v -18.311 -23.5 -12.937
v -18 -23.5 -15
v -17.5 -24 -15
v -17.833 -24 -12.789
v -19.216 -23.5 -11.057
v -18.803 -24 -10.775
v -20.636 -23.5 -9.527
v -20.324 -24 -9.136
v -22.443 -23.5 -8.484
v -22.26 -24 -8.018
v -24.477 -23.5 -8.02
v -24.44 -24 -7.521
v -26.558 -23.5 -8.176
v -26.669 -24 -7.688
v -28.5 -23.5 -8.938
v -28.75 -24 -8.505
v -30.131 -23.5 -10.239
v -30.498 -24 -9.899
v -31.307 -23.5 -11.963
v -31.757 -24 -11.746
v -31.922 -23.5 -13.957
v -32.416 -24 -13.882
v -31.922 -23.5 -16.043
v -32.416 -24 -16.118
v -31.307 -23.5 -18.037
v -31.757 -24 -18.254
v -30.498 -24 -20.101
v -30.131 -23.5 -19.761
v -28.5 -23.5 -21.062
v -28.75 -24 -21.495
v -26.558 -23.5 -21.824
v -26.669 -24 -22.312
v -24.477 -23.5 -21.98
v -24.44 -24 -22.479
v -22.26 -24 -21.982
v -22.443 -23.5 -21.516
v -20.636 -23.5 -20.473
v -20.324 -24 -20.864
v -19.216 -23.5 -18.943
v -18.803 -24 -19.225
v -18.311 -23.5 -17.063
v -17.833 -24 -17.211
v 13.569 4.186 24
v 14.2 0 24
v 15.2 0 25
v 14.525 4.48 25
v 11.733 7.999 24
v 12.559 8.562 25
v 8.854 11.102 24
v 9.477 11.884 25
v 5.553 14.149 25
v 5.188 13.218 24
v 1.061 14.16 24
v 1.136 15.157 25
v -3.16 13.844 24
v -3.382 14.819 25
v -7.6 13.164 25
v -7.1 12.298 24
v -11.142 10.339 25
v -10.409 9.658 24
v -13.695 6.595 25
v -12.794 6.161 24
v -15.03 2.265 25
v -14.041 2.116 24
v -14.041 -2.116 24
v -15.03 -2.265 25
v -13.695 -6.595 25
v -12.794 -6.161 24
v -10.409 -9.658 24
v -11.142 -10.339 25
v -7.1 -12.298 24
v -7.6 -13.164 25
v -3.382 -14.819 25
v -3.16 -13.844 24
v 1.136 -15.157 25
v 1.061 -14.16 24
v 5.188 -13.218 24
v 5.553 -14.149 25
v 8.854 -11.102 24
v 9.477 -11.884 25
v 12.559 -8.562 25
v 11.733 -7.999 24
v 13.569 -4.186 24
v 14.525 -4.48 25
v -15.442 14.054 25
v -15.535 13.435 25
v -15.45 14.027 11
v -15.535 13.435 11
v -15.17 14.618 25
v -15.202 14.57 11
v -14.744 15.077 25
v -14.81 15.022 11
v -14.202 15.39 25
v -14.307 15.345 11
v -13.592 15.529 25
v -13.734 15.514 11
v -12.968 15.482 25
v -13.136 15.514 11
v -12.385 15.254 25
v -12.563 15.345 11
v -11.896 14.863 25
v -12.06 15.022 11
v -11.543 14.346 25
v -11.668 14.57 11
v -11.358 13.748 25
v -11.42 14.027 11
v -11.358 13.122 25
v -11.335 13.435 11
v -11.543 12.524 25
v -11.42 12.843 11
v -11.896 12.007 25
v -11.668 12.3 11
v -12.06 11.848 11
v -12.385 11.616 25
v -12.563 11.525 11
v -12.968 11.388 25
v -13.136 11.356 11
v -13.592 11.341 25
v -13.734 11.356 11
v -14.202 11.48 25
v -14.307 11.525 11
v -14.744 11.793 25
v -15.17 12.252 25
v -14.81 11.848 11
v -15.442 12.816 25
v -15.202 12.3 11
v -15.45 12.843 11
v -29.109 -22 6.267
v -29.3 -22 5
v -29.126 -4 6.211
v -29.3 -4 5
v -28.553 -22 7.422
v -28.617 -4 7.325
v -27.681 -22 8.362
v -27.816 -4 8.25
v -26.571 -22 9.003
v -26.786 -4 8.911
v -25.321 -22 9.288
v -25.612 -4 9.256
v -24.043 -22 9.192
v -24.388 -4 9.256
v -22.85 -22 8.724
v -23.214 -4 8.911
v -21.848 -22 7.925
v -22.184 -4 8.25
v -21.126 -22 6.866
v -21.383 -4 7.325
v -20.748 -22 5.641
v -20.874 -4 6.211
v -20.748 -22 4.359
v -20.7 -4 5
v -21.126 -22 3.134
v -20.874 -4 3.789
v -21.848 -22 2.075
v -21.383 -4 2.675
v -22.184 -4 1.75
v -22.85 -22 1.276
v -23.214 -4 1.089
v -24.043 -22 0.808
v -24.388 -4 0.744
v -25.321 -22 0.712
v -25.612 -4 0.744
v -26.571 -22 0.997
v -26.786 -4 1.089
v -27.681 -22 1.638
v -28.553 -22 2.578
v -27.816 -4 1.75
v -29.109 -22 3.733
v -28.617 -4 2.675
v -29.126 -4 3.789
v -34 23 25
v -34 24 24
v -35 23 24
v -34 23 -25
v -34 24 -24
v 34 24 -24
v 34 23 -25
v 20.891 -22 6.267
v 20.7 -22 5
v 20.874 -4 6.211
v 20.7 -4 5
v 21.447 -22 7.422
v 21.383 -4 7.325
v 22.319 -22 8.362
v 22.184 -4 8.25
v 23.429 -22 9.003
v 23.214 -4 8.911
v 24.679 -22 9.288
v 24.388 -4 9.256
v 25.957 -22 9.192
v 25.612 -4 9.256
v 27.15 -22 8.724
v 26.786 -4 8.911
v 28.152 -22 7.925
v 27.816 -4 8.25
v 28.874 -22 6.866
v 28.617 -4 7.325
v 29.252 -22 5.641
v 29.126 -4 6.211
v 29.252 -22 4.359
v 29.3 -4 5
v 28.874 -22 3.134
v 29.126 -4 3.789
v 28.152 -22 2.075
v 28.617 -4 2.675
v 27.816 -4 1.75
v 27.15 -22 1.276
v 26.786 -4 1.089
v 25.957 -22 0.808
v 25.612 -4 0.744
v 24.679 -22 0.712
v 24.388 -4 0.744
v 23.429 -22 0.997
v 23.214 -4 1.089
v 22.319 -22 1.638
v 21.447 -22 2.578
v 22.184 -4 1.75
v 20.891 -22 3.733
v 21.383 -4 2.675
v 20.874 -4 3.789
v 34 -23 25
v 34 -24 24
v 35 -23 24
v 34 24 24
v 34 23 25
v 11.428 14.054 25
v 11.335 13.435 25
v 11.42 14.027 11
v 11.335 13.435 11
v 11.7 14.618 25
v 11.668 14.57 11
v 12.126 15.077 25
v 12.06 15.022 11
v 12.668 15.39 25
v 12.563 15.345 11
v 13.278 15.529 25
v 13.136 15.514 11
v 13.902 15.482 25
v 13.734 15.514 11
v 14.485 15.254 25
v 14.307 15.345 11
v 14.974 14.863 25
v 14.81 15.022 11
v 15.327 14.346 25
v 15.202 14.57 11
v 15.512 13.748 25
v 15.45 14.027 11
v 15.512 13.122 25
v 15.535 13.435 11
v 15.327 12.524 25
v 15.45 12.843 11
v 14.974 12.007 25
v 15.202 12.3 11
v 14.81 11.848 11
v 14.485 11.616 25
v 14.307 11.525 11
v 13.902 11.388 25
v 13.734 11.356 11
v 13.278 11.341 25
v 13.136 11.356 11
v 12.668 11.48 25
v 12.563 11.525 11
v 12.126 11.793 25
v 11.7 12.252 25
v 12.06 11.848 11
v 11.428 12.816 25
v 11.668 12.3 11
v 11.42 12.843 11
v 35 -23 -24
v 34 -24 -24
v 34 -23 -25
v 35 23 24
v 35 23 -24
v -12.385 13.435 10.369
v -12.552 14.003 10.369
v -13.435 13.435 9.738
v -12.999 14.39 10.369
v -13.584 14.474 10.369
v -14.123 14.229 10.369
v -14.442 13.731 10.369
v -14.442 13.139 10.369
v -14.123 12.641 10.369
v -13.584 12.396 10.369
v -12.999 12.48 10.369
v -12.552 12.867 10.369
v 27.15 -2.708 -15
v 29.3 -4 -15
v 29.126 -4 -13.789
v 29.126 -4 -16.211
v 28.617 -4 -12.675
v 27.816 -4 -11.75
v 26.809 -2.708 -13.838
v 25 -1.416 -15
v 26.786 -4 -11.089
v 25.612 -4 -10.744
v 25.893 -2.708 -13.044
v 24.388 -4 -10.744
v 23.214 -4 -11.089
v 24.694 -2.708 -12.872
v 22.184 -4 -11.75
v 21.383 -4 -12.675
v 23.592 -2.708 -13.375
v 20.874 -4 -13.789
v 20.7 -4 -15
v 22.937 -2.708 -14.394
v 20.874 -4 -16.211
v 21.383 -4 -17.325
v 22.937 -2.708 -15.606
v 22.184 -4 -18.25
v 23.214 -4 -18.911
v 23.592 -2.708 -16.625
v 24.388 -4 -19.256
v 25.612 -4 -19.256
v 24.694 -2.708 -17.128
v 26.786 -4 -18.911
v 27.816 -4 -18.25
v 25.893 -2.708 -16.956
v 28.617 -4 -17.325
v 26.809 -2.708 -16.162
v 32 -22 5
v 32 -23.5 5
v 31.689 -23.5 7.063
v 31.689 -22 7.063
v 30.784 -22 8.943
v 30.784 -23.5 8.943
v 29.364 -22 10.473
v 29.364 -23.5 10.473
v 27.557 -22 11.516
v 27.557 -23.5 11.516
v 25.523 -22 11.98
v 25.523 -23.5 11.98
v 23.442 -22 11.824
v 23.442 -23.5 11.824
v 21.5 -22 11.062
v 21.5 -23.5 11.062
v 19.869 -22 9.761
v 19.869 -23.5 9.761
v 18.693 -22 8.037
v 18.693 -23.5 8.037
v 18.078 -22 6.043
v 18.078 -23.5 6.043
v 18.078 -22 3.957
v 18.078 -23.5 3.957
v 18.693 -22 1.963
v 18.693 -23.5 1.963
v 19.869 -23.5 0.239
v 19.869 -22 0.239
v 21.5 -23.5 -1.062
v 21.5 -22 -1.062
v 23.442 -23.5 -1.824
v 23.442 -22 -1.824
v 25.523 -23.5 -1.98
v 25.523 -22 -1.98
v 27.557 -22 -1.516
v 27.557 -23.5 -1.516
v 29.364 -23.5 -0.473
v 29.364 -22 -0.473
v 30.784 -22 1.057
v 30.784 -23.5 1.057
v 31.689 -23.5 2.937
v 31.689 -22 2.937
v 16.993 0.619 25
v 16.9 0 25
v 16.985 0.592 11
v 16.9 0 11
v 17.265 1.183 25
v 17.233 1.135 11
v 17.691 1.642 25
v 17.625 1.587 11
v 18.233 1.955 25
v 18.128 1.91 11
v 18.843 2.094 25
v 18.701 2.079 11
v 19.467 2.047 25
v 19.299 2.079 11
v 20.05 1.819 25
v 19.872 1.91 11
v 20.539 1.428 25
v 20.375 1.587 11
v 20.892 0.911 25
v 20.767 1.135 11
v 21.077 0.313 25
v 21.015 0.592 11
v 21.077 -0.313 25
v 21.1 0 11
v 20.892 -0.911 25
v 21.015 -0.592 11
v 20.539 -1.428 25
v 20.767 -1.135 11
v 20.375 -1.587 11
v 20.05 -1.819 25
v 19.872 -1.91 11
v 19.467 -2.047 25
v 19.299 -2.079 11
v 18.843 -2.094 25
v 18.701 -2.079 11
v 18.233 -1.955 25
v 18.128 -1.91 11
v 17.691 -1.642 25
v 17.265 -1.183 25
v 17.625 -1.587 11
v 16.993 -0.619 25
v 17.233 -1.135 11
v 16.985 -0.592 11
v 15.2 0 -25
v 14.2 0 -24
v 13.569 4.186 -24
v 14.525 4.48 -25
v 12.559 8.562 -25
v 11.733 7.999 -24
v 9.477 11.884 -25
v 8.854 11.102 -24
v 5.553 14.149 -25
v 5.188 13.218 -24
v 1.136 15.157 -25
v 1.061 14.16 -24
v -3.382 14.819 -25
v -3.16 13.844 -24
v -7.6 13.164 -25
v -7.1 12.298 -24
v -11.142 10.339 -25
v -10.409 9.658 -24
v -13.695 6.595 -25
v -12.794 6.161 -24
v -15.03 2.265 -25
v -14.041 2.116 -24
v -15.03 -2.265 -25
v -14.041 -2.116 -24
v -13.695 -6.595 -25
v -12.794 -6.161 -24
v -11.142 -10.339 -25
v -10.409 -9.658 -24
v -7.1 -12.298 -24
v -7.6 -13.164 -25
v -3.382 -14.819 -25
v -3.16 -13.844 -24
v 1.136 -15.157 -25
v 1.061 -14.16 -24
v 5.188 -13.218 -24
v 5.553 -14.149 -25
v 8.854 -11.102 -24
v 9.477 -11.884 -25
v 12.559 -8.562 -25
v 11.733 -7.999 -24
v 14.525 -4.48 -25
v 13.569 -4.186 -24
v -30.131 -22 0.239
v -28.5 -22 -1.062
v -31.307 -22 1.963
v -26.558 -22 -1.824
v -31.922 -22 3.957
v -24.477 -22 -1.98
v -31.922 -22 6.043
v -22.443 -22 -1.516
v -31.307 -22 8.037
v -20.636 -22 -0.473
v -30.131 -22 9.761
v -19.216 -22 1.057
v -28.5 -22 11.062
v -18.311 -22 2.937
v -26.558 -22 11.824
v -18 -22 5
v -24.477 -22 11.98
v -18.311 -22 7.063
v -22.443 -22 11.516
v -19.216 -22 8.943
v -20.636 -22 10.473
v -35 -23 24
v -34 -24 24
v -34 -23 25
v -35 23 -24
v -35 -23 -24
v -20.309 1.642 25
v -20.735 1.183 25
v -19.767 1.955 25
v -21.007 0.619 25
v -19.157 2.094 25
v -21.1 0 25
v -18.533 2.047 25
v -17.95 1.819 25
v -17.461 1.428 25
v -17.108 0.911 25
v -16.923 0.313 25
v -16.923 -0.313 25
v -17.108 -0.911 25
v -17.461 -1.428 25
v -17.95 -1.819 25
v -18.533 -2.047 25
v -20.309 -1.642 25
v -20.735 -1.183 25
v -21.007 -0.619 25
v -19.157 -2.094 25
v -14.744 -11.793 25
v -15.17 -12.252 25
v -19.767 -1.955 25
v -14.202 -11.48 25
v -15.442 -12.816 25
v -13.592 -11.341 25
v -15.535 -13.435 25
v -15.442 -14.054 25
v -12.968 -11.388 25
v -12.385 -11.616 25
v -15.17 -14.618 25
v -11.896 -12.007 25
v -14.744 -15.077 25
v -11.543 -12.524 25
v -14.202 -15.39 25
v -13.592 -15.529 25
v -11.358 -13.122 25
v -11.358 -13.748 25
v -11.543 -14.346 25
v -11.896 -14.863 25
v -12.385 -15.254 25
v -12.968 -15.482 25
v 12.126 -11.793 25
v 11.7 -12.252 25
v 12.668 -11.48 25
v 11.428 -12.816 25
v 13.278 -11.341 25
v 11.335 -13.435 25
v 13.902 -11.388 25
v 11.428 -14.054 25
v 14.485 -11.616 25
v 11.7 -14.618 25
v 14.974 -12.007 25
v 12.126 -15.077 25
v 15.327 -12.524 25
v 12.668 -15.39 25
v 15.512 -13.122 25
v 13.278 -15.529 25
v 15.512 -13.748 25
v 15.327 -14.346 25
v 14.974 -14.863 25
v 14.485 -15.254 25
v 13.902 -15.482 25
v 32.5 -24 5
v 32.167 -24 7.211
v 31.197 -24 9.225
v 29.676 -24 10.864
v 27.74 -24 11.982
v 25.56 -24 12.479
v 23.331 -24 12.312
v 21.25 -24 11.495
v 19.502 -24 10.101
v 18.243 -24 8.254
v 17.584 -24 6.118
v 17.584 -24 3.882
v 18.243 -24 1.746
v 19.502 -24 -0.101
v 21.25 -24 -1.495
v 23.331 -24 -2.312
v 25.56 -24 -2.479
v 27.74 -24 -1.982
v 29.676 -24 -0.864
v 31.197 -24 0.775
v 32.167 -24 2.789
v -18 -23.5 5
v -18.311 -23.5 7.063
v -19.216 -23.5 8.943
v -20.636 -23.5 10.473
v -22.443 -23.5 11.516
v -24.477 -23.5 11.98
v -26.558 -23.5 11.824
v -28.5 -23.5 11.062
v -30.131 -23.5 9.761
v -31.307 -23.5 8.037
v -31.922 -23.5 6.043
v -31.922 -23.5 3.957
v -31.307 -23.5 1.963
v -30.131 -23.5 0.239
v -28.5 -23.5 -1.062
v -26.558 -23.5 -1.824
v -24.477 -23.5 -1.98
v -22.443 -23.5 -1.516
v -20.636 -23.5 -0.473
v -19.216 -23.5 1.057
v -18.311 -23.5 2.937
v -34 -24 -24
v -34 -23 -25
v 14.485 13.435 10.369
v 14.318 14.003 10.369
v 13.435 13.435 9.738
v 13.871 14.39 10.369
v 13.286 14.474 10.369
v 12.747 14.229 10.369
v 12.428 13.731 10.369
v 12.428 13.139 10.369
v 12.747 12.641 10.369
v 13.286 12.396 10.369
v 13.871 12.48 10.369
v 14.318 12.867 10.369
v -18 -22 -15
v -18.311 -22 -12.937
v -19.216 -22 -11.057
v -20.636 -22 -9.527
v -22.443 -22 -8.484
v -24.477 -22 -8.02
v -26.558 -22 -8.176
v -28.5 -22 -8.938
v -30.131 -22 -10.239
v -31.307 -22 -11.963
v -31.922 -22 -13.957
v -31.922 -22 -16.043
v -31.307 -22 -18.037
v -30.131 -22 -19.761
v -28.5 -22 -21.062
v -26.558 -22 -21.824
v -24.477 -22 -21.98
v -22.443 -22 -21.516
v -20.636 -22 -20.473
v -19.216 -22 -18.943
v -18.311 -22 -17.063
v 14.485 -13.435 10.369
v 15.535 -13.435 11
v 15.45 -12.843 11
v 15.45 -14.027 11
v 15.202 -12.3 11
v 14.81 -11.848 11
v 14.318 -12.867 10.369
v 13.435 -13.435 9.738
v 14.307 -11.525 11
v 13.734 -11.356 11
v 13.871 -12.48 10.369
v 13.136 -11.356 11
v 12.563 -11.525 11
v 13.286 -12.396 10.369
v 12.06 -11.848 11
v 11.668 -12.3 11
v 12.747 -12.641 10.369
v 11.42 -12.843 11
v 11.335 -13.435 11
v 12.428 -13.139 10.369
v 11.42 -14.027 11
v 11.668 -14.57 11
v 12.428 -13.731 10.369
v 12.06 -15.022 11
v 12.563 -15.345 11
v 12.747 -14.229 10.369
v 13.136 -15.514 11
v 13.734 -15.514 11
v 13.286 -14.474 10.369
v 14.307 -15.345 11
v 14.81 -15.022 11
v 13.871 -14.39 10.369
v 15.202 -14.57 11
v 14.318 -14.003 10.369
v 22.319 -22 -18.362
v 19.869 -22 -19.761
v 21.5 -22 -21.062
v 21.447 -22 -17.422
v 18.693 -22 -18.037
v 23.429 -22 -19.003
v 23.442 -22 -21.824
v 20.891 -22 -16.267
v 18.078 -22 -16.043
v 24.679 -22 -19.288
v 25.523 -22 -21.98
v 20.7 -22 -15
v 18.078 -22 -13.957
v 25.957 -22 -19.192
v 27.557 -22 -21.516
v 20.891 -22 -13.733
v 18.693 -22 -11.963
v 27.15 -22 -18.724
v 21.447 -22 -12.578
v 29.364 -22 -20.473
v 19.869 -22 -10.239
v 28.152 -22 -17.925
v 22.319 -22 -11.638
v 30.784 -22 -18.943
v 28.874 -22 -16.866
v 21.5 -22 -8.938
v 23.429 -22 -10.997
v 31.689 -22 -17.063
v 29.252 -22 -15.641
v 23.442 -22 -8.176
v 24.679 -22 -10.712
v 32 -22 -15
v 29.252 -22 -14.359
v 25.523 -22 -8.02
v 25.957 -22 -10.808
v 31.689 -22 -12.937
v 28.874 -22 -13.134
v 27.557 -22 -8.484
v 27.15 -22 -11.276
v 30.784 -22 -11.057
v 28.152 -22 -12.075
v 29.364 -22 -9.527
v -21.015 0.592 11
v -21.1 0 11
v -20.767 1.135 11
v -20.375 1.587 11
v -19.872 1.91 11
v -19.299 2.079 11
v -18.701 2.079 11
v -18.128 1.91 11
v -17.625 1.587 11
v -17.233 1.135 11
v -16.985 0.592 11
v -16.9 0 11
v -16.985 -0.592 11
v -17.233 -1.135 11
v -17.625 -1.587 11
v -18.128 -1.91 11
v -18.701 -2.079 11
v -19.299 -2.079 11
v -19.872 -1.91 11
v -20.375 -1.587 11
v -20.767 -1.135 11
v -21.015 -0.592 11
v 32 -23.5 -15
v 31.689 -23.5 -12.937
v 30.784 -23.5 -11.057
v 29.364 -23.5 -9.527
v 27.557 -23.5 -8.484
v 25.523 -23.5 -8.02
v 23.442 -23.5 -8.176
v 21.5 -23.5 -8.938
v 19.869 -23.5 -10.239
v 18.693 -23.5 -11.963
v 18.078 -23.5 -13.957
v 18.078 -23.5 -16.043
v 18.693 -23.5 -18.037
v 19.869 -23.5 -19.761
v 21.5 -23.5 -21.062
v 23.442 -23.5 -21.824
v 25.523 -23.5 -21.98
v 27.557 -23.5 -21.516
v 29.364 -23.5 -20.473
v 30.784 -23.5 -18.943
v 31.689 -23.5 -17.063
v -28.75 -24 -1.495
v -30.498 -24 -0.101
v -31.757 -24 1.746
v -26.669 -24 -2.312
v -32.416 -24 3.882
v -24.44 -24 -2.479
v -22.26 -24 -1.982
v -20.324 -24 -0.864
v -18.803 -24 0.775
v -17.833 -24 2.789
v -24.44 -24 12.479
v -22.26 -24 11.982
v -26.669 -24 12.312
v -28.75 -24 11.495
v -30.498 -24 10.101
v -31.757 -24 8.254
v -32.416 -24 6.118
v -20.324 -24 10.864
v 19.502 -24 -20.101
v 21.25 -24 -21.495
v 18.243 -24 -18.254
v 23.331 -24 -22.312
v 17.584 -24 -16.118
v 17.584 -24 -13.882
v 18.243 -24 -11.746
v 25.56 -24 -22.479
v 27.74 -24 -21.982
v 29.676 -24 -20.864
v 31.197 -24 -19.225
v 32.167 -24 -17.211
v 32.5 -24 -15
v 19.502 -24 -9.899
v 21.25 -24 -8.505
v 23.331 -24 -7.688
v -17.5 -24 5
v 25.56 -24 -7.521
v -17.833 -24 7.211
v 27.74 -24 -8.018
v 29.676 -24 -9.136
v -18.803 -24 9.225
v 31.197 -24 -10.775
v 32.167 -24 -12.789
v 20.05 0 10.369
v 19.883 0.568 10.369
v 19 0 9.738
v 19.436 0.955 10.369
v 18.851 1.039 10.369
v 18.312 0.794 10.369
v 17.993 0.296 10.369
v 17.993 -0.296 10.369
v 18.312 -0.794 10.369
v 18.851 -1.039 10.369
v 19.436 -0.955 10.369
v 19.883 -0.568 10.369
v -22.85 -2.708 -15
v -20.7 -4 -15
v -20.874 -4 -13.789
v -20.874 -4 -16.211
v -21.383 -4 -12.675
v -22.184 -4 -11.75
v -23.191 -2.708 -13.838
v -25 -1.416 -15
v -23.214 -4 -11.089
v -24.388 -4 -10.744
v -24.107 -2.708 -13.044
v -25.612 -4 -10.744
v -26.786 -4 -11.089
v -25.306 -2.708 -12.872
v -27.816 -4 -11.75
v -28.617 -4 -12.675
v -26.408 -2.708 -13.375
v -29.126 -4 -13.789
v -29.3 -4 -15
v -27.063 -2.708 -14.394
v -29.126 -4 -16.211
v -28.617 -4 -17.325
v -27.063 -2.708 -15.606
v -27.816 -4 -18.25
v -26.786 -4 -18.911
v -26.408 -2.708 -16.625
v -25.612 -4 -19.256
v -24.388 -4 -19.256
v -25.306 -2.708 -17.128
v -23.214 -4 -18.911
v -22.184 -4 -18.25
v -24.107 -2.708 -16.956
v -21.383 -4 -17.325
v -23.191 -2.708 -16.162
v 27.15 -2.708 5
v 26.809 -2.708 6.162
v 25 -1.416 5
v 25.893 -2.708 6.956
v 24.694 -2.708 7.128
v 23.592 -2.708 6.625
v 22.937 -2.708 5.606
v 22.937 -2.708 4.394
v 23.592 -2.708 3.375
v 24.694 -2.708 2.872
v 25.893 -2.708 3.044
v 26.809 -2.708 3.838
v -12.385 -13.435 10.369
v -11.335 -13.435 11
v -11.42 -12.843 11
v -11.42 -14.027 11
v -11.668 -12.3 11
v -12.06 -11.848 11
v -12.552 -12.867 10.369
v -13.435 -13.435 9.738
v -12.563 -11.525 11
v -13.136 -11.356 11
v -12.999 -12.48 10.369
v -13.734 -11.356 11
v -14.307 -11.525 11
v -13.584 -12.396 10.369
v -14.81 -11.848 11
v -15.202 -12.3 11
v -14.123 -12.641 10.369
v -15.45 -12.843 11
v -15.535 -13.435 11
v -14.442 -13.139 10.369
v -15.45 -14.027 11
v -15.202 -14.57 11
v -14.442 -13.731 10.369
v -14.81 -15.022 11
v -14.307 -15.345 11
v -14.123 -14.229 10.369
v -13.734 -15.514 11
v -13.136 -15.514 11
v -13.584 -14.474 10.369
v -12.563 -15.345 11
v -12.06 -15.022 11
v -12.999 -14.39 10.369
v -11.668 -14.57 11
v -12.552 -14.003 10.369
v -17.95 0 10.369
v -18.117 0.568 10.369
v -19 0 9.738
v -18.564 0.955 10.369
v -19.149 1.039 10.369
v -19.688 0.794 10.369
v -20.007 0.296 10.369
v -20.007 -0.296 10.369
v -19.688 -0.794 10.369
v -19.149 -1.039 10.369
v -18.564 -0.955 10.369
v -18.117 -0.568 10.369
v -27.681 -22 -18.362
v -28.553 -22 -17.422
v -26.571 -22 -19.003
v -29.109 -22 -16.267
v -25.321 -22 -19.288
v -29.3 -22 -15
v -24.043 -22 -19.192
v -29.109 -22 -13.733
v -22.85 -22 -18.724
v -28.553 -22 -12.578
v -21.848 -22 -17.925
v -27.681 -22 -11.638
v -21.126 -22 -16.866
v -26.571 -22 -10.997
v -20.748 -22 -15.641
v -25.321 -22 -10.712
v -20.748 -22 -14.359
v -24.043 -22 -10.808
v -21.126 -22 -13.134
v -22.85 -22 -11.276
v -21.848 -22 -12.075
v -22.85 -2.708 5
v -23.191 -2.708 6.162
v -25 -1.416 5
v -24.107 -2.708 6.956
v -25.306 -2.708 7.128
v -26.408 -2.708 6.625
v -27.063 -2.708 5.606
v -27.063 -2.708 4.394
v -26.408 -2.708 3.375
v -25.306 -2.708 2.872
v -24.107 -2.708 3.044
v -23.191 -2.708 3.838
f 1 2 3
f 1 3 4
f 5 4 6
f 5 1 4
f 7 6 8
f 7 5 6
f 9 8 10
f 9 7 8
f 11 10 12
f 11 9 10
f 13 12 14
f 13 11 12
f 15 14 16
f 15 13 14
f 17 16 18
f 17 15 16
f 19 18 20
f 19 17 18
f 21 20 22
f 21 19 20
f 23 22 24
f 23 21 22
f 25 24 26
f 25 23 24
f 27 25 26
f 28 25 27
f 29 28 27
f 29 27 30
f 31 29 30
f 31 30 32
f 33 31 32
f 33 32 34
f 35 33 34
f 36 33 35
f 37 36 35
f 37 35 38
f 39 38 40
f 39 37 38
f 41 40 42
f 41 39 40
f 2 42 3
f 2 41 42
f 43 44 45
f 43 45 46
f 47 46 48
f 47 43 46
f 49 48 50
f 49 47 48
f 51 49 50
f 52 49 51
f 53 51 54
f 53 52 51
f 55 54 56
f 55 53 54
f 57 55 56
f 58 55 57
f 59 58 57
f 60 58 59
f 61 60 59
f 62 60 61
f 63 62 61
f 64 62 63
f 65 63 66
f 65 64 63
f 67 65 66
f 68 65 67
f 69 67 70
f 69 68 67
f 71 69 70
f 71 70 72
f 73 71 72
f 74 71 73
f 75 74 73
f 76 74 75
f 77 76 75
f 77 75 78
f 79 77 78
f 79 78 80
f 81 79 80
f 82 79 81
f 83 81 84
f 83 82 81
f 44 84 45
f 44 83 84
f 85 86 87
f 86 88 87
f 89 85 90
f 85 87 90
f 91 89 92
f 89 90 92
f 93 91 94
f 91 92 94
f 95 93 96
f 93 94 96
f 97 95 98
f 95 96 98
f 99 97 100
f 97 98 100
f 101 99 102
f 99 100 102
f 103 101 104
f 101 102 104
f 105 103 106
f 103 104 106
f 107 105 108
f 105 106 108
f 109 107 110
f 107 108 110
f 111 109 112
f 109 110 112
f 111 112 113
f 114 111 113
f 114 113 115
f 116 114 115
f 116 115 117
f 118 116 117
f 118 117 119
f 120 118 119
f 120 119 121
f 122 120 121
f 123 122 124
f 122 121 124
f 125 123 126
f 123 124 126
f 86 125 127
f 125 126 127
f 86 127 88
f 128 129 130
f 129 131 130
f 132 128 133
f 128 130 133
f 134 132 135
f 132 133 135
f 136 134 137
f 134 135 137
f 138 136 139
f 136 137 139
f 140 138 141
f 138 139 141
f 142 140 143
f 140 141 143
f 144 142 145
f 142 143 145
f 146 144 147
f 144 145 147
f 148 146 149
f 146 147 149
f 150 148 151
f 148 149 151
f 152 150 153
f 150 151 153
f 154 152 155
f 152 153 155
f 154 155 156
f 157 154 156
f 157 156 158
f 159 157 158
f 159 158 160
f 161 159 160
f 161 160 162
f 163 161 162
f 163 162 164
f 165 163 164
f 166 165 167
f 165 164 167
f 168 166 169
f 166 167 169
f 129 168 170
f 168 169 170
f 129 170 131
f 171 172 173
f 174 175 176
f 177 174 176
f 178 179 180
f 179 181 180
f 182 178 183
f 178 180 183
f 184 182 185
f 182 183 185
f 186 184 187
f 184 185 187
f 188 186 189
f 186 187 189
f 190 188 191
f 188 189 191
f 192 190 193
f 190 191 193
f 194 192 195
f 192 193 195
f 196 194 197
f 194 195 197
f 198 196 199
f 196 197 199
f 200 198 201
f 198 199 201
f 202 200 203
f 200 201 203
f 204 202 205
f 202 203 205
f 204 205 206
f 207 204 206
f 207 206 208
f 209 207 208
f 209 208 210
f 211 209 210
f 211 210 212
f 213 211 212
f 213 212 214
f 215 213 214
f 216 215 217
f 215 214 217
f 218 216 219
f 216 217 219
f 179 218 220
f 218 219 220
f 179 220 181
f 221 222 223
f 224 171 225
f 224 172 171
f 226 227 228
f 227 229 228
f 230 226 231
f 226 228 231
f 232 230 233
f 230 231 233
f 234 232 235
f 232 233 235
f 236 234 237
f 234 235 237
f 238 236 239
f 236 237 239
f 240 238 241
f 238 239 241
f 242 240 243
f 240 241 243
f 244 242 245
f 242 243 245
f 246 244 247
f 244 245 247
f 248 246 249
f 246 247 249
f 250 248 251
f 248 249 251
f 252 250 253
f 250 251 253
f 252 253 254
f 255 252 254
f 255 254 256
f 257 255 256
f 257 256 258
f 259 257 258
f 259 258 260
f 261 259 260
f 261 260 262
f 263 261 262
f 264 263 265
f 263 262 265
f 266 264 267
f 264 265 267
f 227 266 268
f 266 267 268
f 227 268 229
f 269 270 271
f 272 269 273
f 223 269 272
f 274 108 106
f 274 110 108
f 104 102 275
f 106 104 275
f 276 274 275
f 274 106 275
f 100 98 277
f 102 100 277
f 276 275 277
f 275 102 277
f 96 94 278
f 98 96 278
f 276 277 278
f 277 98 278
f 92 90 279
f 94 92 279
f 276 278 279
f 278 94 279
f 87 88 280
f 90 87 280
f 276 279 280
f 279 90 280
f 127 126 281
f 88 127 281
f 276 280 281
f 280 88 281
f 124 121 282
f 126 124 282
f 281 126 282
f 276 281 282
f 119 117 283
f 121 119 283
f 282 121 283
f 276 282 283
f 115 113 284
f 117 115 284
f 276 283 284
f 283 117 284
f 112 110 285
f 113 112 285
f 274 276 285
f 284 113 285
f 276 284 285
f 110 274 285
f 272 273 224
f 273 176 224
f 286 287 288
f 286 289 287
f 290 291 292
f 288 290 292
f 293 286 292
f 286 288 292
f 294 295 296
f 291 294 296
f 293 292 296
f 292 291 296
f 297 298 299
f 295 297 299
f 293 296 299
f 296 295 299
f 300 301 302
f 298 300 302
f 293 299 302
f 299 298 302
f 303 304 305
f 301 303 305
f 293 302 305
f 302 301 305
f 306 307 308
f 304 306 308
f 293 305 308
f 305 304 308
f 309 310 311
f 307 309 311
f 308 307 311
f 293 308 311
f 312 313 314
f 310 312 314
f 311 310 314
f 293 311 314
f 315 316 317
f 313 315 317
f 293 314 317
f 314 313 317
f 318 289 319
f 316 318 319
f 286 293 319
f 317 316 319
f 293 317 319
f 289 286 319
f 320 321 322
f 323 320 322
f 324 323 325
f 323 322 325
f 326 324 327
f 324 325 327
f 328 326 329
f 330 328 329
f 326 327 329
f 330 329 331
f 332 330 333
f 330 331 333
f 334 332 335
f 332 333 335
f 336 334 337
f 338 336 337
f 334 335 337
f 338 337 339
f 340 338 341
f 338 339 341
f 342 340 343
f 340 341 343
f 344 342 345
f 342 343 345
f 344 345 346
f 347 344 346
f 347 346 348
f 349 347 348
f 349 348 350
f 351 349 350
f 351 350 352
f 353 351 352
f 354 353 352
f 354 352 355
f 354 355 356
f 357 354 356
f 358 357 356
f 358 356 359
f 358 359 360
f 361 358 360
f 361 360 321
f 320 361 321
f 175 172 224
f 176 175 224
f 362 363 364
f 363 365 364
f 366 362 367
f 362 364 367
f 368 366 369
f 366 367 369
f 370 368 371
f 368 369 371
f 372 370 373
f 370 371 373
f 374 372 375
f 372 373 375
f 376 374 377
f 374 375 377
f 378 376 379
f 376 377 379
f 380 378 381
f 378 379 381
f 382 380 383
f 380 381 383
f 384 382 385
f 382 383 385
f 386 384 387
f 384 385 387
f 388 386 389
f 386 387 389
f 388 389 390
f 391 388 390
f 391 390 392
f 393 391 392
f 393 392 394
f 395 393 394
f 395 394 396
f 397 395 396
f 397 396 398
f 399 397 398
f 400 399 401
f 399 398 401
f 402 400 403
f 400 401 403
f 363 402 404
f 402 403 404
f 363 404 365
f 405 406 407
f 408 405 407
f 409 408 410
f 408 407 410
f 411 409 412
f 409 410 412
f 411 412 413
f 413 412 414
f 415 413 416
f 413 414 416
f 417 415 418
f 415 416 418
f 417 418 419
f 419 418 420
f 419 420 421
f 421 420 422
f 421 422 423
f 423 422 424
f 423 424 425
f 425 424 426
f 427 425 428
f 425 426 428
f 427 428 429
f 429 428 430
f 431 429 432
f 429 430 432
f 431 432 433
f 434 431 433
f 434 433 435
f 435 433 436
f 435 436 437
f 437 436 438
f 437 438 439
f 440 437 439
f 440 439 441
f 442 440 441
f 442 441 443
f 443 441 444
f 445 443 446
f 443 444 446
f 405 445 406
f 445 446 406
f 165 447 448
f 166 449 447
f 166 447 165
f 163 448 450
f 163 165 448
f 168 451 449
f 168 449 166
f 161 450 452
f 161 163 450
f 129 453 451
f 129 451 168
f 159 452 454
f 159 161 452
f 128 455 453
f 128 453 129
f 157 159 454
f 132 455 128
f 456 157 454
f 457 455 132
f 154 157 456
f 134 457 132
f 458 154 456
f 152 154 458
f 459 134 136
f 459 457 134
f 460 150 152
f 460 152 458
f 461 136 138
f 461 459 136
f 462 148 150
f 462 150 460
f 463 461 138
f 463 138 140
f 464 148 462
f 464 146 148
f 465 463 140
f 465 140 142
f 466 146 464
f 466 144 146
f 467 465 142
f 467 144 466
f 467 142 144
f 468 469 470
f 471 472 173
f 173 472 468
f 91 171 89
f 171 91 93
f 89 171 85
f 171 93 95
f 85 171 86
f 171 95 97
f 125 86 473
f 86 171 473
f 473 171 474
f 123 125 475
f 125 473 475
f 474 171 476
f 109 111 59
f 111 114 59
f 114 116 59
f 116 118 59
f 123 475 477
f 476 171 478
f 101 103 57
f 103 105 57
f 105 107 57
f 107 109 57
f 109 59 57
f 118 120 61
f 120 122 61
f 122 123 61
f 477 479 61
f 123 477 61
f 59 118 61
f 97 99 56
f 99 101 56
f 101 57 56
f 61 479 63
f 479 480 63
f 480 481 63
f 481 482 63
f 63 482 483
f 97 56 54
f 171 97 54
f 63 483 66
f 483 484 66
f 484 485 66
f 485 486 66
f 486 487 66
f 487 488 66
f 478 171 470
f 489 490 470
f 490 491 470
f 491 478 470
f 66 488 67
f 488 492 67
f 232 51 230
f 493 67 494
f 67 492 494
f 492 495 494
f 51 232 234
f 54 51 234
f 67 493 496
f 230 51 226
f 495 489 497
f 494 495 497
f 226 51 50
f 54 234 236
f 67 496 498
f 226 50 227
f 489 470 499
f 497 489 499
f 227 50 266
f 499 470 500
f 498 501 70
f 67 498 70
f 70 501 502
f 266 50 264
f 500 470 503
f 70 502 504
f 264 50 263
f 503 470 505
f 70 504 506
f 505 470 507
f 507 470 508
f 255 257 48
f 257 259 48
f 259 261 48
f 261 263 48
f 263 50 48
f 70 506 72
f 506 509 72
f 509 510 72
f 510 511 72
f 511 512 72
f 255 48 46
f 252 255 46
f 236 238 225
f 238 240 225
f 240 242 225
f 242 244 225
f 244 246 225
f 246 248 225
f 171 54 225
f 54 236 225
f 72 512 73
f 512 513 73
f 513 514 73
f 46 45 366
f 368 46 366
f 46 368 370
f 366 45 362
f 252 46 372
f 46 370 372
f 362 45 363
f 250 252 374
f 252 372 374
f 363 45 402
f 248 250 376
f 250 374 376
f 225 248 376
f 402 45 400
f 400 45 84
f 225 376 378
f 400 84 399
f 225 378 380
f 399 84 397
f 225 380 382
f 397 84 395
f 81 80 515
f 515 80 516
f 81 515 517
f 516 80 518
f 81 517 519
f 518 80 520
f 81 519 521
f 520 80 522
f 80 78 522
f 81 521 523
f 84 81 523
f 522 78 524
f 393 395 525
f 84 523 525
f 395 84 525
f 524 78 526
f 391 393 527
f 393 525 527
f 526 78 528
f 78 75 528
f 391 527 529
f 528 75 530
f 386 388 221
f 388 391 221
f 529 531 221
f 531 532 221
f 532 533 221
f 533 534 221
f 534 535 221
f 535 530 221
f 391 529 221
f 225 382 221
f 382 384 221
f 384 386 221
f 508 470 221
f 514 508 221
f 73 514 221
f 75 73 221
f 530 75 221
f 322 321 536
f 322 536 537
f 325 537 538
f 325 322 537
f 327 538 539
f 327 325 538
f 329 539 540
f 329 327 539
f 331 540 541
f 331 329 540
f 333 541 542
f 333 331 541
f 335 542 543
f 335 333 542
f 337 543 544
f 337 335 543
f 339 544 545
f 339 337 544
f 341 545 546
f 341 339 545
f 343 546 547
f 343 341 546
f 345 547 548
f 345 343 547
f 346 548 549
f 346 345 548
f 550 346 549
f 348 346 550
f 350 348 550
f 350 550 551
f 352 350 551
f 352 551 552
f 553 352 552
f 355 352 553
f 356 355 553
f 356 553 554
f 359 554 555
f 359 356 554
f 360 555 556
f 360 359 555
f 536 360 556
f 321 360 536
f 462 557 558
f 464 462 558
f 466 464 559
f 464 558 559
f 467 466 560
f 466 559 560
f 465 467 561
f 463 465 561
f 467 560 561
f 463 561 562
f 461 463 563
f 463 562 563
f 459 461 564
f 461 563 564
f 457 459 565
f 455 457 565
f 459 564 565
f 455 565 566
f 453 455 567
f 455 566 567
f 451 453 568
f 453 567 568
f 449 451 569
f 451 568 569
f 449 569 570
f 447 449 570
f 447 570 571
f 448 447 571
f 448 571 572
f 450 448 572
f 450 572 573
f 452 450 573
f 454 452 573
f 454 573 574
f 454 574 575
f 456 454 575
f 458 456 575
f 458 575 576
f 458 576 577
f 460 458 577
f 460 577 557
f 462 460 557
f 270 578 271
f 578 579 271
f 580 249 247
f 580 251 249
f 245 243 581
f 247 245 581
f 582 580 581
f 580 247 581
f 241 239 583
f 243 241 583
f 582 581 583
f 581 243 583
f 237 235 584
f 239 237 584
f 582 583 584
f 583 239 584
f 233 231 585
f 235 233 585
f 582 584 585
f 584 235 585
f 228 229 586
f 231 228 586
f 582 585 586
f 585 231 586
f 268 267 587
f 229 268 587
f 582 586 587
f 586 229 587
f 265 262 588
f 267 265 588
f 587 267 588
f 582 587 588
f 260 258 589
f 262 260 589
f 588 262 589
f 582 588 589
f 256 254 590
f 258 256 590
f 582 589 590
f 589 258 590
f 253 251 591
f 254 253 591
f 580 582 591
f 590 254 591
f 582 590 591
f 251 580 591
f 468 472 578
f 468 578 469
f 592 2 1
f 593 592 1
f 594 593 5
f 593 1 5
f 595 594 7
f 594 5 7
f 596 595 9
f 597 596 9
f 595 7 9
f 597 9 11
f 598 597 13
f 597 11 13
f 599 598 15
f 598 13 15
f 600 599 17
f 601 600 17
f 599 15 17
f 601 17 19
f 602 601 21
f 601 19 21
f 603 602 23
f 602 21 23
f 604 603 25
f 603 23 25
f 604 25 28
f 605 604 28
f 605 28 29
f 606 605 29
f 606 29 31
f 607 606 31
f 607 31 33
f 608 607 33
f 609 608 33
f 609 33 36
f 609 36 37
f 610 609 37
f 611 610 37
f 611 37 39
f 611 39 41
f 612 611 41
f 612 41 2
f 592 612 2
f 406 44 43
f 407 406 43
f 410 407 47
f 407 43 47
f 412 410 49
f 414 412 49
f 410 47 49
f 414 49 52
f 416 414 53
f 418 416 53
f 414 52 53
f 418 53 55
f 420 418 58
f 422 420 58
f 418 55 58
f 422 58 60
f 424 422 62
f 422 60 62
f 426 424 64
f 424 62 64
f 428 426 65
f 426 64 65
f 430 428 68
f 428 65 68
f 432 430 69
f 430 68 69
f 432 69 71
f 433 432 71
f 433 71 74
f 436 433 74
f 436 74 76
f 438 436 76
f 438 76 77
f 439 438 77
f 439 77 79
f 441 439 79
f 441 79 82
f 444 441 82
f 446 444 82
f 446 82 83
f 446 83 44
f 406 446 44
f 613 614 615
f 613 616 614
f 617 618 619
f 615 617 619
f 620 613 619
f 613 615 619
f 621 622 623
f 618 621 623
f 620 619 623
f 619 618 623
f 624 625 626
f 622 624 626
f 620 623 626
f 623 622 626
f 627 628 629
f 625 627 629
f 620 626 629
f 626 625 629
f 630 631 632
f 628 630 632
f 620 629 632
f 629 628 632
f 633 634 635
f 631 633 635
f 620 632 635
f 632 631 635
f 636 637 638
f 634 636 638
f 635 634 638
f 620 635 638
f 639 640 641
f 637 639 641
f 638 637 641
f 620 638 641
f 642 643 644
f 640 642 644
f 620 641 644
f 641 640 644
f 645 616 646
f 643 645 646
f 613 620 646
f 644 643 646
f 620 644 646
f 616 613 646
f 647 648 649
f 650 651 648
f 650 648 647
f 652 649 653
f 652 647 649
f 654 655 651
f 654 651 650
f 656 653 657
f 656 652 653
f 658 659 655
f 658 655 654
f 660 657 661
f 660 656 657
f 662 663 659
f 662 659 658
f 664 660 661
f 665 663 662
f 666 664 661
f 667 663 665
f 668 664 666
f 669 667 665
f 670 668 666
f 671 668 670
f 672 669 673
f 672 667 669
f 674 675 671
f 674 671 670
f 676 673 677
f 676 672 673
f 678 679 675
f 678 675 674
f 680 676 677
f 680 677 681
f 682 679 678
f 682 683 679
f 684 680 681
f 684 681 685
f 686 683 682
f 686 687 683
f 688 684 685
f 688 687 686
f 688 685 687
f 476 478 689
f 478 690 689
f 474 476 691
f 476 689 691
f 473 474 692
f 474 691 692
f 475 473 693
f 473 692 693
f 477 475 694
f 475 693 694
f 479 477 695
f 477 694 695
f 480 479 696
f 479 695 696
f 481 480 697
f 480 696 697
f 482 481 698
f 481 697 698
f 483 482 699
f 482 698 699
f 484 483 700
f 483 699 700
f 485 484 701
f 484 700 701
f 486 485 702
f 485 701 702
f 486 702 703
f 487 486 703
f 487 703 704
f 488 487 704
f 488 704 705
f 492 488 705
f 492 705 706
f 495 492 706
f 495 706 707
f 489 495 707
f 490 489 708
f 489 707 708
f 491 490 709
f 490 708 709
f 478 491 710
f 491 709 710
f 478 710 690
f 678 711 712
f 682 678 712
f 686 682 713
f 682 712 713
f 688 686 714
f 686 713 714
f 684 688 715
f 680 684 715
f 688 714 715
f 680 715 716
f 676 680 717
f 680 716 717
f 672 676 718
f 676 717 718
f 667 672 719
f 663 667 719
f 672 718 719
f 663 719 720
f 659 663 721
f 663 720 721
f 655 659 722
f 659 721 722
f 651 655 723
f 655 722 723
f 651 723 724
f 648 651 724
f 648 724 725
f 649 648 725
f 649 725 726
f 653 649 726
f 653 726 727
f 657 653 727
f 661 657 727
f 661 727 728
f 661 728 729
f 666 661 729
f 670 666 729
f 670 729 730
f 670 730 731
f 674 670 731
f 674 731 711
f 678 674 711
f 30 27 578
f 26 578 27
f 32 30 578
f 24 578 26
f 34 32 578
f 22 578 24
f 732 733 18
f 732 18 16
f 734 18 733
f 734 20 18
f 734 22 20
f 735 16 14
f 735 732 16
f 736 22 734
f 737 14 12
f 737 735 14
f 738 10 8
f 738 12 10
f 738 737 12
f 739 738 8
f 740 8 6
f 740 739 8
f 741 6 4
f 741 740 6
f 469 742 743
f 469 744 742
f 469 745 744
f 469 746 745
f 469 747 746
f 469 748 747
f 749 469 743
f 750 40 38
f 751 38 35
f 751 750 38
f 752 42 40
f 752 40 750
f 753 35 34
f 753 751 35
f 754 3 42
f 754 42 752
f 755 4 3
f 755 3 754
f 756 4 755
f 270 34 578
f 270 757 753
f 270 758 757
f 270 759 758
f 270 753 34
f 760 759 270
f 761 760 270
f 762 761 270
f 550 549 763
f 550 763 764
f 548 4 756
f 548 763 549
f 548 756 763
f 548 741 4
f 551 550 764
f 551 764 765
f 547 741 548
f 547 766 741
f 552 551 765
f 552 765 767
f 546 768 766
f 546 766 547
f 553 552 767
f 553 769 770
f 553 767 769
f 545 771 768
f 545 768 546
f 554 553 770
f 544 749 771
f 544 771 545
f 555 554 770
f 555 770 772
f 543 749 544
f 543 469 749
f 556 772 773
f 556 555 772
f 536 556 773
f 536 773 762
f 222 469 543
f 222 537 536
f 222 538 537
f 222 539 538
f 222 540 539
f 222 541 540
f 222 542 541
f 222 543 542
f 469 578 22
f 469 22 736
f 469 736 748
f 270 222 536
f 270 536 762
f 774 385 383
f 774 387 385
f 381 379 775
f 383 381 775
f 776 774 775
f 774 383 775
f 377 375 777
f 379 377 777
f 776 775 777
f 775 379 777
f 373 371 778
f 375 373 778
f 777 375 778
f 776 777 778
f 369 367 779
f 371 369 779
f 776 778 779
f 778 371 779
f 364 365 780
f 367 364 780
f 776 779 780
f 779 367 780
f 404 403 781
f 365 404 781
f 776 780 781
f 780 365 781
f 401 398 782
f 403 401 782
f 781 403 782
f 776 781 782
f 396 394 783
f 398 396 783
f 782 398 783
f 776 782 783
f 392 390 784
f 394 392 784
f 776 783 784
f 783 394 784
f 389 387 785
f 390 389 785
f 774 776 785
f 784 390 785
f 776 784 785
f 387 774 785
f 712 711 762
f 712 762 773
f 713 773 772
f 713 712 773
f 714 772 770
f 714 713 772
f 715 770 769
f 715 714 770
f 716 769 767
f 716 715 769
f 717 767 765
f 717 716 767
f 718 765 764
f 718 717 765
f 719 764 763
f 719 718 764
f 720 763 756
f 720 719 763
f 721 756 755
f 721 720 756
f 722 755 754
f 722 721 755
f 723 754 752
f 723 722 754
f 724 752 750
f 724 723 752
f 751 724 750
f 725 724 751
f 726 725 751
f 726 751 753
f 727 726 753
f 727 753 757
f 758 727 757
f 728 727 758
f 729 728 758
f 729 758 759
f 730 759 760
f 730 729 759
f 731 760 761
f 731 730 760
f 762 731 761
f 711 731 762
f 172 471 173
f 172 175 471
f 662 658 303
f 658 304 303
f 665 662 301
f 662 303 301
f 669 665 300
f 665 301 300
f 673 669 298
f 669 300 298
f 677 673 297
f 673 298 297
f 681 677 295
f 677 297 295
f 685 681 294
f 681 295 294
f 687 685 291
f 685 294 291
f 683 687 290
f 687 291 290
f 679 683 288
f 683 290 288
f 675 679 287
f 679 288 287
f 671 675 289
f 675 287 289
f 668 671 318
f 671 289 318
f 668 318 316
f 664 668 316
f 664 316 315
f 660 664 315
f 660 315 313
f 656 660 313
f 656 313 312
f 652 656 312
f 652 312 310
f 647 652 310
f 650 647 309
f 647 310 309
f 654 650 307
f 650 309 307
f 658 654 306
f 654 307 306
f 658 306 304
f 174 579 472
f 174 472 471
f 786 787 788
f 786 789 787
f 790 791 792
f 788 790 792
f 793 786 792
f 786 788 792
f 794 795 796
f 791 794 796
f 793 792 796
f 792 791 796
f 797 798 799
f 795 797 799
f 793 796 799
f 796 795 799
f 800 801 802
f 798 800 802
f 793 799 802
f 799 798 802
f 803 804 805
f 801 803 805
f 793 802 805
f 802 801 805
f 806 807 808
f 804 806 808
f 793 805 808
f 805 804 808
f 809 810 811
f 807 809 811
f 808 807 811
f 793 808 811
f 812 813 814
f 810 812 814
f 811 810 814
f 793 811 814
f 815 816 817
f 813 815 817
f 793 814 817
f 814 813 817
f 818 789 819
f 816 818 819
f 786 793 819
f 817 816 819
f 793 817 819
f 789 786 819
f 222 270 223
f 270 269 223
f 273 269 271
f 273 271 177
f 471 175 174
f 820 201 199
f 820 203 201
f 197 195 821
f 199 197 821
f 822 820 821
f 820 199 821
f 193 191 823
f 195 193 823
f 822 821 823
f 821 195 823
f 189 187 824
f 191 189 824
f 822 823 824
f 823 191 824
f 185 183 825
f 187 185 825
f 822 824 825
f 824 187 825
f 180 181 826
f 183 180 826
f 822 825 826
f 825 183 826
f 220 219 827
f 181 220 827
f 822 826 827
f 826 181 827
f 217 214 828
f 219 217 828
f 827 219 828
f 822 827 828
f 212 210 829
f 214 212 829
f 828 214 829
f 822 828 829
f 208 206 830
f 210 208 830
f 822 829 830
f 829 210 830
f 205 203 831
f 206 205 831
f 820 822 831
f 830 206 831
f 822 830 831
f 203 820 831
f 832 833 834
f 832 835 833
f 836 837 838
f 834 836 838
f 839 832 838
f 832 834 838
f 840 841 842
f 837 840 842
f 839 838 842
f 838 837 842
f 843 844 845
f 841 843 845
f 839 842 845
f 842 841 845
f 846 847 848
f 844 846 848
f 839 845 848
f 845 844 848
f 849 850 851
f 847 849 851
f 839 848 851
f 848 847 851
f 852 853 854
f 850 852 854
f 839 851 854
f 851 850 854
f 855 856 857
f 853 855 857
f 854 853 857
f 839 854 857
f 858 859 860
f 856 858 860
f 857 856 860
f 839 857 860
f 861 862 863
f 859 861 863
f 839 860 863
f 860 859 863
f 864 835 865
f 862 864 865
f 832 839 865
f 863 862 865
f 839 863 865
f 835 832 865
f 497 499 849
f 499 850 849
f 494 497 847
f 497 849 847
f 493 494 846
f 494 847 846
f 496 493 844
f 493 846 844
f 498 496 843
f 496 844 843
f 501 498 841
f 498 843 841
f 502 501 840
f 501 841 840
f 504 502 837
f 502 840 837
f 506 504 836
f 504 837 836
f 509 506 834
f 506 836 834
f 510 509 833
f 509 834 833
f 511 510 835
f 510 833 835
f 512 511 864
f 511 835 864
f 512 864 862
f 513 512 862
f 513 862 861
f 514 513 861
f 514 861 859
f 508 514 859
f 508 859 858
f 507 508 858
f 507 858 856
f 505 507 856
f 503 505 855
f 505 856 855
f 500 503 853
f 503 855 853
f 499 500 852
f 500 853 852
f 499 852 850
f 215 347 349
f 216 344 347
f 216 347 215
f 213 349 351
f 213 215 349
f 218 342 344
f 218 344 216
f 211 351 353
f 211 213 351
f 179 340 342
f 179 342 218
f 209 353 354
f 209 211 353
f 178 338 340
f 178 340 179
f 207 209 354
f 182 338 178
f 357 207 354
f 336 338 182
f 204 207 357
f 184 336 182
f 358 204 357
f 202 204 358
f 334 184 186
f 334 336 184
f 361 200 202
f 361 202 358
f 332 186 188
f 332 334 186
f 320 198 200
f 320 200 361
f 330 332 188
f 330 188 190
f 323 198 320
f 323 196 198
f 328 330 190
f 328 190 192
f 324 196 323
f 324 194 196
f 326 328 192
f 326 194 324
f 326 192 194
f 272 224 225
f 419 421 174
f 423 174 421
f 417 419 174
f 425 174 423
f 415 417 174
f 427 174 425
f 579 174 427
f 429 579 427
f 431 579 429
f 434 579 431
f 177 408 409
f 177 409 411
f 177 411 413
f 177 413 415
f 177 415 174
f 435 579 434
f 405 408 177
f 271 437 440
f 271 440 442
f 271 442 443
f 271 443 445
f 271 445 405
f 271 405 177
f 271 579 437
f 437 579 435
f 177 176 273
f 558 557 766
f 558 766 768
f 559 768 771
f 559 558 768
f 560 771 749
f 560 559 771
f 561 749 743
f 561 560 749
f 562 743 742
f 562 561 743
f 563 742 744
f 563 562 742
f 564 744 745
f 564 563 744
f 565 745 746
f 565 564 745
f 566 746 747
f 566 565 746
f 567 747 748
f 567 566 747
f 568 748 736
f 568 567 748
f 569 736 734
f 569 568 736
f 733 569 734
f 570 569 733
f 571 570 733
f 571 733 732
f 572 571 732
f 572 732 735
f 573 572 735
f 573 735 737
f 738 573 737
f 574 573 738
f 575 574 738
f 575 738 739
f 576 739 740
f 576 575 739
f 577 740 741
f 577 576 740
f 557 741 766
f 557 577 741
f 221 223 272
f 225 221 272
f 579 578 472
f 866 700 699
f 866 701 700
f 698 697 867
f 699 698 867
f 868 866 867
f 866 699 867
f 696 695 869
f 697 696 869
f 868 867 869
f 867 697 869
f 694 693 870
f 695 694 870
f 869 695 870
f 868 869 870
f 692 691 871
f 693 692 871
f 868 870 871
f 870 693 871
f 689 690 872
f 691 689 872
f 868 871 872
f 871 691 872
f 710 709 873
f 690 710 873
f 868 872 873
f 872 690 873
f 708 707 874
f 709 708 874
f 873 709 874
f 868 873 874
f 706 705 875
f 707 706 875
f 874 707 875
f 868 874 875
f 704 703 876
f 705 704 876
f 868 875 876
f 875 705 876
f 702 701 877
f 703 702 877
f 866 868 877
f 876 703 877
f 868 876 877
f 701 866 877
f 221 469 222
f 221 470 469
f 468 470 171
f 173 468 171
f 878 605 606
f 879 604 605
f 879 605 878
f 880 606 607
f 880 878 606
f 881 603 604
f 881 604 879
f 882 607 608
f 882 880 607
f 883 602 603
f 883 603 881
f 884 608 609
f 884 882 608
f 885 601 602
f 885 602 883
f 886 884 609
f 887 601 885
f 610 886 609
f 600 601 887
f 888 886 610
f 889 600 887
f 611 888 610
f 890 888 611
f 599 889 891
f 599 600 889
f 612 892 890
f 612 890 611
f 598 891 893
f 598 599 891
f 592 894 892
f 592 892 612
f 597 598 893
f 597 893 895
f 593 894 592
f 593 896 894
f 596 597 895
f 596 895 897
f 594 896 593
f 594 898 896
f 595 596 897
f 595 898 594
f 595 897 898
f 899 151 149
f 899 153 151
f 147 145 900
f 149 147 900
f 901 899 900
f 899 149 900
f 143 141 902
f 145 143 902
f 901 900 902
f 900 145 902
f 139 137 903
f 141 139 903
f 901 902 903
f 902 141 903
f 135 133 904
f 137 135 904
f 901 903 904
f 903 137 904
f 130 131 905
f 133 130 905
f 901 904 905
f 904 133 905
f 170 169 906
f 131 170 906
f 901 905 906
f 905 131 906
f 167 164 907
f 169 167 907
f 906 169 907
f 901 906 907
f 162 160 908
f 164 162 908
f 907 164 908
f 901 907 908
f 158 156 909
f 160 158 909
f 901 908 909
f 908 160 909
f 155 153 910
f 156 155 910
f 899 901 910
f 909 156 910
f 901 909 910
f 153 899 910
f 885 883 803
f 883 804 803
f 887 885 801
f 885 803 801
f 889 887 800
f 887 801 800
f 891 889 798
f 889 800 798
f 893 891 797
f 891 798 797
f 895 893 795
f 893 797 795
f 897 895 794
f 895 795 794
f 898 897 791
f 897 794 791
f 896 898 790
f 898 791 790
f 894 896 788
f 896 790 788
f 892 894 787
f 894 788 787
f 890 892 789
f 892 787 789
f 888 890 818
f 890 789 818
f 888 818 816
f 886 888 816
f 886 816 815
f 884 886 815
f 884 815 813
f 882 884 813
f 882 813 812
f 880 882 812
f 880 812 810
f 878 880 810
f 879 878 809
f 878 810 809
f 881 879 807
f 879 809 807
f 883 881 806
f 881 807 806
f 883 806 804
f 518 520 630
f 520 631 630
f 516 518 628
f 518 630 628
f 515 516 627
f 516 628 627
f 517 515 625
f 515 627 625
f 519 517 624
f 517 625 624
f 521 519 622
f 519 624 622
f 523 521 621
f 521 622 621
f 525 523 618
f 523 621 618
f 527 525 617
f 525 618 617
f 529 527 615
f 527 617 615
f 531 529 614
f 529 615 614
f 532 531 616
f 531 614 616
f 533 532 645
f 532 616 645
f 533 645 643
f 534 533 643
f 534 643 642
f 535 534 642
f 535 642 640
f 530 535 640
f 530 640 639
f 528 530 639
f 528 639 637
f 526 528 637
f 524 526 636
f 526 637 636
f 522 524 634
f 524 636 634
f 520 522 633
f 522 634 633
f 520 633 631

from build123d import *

# Parameters (mm, degrees)
ESQUISSE1_W                                        = 70
ESQUISSE1_H                                        = 50
BOSS_EXTRU_1_DEPTH                                 = 48
D_GAGEMENT_M251_D                                  = 28.4
DIAM_TRE_DU_PER_AGE_4_2_4_2_1_D                    = 4.2
DIAM_TRE_DU_PER_AGE_4_2_4_2_1_DEPTH                = 14
DIAM_TRE_DU_PER_AGE_4_2_4_2_1_TIP                  = 1.2618073
CHAMBRAGE_POUR_VIS_T_TE_HEXAGONALE_M81_D           = 8.6
CHAMBRAGE_POUR_VIS_T_TE_HEXAGONALE_M81_DEPTH       = 20
CHAMBRAGE_POUR_VIS_T_TE_HEXAGONALE_M81_CBORE_D     = 14
CHAMBRAGE_POUR_VIS_T_TE_HEXAGONALE_M81_CBORE_DEPTH = 2
CHAMBRAGE_POUR_VIS_T_TE_HEXAGONALE_M81_TIP         = 2.583700662
CHANFREIN1_SIZE                                    = 0.5
CHANFREIN2_SIZE                                    = 1


with BuildPart() as part:
    # Esquisse1 → Boss.-Extru.1 (new body)
    with BuildSketch(Plane.XZ.offset(24)):
        Rectangle(ESQUISSE1_W, ESQUISSE1_H)
    extrude(amount=-BOSS_EXTRU_1_DEPTH)

    # Dégagement M251 (through all)
    with Locations(Plane(origin=(0, 0, -25), x_dir=(-1, 0, 0), z_dir=(0, 0, -1))):
        with Locations((0, 0)):
            Hole(D_GAGEMENT_M251_D / 2)

    # Diamètre du perçage Ø4.2 (4.2)1
    with Locations(Plane.XY.offset(25)):
        with Locations((13.435028843, -13.435028843), (13.435028843, 13.435028843), (19, 0), (-13.435028843, 13.435028843), (-13.435028843, -13.435028843), (-19, 0)):
            Hole(DIAM_TRE_DU_PER_AGE_4_2_4_2_1_D / 2, depth=DIAM_TRE_DU_PER_AGE_4_2_4_2_1_DEPTH)
            with Locations((0, 0, -(DIAM_TRE_DU_PER_AGE_4_2_4_2_1_DEPTH + DIAM_TRE_DU_PER_AGE_4_2_4_2_1_TIP / 2))):  # 118° drill point
                Cone(0, DIAM_TRE_DU_PER_AGE_4_2_4_2_1_D / 2, DIAM_TRE_DU_PER_AGE_4_2_4_2_1_TIP, mode=Mode.SUBTRACT)

    # Chambrage pour vis à tête hexagonale M81
    with Locations(Plane.XZ.offset(24)):
        with Locations((25, 5), (25, -15), (-25, 5), (-25, -15)):
            CounterBoreHole(CHAMBRAGE_POUR_VIS_T_TE_HEXAGONALE_M81_D / 2, CHAMBRAGE_POUR_VIS_T_TE_HEXAGONALE_M81_CBORE_D / 2, CHAMBRAGE_POUR_VIS_T_TE_HEXAGONALE_M81_CBORE_DEPTH, depth=CHAMBRAGE_POUR_VIS_T_TE_HEXAGONALE_M81_DEPTH)
            with Locations((0, 0, -(CHAMBRAGE_POUR_VIS_T_TE_HEXAGONALE_M81_DEPTH + CHAMBRAGE_POUR_VIS_T_TE_HEXAGONALE_M81_TIP / 2))):  # 118° drill point
                Cone(0, CHAMBRAGE_POUR_VIS_T_TE_HEXAGONALE_M81_D / 2, CHAMBRAGE_POUR_VIS_T_TE_HEXAGONALE_M81_TIP, mode=Mode.SUBTRACT)

    # Chanfrein1
    chanfrein1_edges = [part.edges().sort_by_distance(p)[0] for p in [
        (-32, -24, -15),
        (-32, -24, 5),
        (18, -24, -15),
        (18, -24, 5),
    ]]
    chamfer(chanfrein1_edges, length=CHANFREIN1_SIZE)

    # Chanfrein2
    chanfrein2_edges = [part.edges().sort_by_distance(p)[0] for p in [
        (35, 24, 0),
        (0, 24, 25),
        (-14.2, 0, -25),
        (-14.2, 0, 25),
        (-35, 24, 0),
        (0, -24, 25),
        (35, -24, 0),
        (0, -24, -25),
        (-35, -24, 0),
        (0, 24, -25),
        (-35, 0, 25),
        (35, 0, 25),
        (35, 0, -25),
        (-35, 0, -25),
    ]]
    chamfer(chanfrein2_edges, length=CHANFREIN2_SIZE)


solid = part.part
